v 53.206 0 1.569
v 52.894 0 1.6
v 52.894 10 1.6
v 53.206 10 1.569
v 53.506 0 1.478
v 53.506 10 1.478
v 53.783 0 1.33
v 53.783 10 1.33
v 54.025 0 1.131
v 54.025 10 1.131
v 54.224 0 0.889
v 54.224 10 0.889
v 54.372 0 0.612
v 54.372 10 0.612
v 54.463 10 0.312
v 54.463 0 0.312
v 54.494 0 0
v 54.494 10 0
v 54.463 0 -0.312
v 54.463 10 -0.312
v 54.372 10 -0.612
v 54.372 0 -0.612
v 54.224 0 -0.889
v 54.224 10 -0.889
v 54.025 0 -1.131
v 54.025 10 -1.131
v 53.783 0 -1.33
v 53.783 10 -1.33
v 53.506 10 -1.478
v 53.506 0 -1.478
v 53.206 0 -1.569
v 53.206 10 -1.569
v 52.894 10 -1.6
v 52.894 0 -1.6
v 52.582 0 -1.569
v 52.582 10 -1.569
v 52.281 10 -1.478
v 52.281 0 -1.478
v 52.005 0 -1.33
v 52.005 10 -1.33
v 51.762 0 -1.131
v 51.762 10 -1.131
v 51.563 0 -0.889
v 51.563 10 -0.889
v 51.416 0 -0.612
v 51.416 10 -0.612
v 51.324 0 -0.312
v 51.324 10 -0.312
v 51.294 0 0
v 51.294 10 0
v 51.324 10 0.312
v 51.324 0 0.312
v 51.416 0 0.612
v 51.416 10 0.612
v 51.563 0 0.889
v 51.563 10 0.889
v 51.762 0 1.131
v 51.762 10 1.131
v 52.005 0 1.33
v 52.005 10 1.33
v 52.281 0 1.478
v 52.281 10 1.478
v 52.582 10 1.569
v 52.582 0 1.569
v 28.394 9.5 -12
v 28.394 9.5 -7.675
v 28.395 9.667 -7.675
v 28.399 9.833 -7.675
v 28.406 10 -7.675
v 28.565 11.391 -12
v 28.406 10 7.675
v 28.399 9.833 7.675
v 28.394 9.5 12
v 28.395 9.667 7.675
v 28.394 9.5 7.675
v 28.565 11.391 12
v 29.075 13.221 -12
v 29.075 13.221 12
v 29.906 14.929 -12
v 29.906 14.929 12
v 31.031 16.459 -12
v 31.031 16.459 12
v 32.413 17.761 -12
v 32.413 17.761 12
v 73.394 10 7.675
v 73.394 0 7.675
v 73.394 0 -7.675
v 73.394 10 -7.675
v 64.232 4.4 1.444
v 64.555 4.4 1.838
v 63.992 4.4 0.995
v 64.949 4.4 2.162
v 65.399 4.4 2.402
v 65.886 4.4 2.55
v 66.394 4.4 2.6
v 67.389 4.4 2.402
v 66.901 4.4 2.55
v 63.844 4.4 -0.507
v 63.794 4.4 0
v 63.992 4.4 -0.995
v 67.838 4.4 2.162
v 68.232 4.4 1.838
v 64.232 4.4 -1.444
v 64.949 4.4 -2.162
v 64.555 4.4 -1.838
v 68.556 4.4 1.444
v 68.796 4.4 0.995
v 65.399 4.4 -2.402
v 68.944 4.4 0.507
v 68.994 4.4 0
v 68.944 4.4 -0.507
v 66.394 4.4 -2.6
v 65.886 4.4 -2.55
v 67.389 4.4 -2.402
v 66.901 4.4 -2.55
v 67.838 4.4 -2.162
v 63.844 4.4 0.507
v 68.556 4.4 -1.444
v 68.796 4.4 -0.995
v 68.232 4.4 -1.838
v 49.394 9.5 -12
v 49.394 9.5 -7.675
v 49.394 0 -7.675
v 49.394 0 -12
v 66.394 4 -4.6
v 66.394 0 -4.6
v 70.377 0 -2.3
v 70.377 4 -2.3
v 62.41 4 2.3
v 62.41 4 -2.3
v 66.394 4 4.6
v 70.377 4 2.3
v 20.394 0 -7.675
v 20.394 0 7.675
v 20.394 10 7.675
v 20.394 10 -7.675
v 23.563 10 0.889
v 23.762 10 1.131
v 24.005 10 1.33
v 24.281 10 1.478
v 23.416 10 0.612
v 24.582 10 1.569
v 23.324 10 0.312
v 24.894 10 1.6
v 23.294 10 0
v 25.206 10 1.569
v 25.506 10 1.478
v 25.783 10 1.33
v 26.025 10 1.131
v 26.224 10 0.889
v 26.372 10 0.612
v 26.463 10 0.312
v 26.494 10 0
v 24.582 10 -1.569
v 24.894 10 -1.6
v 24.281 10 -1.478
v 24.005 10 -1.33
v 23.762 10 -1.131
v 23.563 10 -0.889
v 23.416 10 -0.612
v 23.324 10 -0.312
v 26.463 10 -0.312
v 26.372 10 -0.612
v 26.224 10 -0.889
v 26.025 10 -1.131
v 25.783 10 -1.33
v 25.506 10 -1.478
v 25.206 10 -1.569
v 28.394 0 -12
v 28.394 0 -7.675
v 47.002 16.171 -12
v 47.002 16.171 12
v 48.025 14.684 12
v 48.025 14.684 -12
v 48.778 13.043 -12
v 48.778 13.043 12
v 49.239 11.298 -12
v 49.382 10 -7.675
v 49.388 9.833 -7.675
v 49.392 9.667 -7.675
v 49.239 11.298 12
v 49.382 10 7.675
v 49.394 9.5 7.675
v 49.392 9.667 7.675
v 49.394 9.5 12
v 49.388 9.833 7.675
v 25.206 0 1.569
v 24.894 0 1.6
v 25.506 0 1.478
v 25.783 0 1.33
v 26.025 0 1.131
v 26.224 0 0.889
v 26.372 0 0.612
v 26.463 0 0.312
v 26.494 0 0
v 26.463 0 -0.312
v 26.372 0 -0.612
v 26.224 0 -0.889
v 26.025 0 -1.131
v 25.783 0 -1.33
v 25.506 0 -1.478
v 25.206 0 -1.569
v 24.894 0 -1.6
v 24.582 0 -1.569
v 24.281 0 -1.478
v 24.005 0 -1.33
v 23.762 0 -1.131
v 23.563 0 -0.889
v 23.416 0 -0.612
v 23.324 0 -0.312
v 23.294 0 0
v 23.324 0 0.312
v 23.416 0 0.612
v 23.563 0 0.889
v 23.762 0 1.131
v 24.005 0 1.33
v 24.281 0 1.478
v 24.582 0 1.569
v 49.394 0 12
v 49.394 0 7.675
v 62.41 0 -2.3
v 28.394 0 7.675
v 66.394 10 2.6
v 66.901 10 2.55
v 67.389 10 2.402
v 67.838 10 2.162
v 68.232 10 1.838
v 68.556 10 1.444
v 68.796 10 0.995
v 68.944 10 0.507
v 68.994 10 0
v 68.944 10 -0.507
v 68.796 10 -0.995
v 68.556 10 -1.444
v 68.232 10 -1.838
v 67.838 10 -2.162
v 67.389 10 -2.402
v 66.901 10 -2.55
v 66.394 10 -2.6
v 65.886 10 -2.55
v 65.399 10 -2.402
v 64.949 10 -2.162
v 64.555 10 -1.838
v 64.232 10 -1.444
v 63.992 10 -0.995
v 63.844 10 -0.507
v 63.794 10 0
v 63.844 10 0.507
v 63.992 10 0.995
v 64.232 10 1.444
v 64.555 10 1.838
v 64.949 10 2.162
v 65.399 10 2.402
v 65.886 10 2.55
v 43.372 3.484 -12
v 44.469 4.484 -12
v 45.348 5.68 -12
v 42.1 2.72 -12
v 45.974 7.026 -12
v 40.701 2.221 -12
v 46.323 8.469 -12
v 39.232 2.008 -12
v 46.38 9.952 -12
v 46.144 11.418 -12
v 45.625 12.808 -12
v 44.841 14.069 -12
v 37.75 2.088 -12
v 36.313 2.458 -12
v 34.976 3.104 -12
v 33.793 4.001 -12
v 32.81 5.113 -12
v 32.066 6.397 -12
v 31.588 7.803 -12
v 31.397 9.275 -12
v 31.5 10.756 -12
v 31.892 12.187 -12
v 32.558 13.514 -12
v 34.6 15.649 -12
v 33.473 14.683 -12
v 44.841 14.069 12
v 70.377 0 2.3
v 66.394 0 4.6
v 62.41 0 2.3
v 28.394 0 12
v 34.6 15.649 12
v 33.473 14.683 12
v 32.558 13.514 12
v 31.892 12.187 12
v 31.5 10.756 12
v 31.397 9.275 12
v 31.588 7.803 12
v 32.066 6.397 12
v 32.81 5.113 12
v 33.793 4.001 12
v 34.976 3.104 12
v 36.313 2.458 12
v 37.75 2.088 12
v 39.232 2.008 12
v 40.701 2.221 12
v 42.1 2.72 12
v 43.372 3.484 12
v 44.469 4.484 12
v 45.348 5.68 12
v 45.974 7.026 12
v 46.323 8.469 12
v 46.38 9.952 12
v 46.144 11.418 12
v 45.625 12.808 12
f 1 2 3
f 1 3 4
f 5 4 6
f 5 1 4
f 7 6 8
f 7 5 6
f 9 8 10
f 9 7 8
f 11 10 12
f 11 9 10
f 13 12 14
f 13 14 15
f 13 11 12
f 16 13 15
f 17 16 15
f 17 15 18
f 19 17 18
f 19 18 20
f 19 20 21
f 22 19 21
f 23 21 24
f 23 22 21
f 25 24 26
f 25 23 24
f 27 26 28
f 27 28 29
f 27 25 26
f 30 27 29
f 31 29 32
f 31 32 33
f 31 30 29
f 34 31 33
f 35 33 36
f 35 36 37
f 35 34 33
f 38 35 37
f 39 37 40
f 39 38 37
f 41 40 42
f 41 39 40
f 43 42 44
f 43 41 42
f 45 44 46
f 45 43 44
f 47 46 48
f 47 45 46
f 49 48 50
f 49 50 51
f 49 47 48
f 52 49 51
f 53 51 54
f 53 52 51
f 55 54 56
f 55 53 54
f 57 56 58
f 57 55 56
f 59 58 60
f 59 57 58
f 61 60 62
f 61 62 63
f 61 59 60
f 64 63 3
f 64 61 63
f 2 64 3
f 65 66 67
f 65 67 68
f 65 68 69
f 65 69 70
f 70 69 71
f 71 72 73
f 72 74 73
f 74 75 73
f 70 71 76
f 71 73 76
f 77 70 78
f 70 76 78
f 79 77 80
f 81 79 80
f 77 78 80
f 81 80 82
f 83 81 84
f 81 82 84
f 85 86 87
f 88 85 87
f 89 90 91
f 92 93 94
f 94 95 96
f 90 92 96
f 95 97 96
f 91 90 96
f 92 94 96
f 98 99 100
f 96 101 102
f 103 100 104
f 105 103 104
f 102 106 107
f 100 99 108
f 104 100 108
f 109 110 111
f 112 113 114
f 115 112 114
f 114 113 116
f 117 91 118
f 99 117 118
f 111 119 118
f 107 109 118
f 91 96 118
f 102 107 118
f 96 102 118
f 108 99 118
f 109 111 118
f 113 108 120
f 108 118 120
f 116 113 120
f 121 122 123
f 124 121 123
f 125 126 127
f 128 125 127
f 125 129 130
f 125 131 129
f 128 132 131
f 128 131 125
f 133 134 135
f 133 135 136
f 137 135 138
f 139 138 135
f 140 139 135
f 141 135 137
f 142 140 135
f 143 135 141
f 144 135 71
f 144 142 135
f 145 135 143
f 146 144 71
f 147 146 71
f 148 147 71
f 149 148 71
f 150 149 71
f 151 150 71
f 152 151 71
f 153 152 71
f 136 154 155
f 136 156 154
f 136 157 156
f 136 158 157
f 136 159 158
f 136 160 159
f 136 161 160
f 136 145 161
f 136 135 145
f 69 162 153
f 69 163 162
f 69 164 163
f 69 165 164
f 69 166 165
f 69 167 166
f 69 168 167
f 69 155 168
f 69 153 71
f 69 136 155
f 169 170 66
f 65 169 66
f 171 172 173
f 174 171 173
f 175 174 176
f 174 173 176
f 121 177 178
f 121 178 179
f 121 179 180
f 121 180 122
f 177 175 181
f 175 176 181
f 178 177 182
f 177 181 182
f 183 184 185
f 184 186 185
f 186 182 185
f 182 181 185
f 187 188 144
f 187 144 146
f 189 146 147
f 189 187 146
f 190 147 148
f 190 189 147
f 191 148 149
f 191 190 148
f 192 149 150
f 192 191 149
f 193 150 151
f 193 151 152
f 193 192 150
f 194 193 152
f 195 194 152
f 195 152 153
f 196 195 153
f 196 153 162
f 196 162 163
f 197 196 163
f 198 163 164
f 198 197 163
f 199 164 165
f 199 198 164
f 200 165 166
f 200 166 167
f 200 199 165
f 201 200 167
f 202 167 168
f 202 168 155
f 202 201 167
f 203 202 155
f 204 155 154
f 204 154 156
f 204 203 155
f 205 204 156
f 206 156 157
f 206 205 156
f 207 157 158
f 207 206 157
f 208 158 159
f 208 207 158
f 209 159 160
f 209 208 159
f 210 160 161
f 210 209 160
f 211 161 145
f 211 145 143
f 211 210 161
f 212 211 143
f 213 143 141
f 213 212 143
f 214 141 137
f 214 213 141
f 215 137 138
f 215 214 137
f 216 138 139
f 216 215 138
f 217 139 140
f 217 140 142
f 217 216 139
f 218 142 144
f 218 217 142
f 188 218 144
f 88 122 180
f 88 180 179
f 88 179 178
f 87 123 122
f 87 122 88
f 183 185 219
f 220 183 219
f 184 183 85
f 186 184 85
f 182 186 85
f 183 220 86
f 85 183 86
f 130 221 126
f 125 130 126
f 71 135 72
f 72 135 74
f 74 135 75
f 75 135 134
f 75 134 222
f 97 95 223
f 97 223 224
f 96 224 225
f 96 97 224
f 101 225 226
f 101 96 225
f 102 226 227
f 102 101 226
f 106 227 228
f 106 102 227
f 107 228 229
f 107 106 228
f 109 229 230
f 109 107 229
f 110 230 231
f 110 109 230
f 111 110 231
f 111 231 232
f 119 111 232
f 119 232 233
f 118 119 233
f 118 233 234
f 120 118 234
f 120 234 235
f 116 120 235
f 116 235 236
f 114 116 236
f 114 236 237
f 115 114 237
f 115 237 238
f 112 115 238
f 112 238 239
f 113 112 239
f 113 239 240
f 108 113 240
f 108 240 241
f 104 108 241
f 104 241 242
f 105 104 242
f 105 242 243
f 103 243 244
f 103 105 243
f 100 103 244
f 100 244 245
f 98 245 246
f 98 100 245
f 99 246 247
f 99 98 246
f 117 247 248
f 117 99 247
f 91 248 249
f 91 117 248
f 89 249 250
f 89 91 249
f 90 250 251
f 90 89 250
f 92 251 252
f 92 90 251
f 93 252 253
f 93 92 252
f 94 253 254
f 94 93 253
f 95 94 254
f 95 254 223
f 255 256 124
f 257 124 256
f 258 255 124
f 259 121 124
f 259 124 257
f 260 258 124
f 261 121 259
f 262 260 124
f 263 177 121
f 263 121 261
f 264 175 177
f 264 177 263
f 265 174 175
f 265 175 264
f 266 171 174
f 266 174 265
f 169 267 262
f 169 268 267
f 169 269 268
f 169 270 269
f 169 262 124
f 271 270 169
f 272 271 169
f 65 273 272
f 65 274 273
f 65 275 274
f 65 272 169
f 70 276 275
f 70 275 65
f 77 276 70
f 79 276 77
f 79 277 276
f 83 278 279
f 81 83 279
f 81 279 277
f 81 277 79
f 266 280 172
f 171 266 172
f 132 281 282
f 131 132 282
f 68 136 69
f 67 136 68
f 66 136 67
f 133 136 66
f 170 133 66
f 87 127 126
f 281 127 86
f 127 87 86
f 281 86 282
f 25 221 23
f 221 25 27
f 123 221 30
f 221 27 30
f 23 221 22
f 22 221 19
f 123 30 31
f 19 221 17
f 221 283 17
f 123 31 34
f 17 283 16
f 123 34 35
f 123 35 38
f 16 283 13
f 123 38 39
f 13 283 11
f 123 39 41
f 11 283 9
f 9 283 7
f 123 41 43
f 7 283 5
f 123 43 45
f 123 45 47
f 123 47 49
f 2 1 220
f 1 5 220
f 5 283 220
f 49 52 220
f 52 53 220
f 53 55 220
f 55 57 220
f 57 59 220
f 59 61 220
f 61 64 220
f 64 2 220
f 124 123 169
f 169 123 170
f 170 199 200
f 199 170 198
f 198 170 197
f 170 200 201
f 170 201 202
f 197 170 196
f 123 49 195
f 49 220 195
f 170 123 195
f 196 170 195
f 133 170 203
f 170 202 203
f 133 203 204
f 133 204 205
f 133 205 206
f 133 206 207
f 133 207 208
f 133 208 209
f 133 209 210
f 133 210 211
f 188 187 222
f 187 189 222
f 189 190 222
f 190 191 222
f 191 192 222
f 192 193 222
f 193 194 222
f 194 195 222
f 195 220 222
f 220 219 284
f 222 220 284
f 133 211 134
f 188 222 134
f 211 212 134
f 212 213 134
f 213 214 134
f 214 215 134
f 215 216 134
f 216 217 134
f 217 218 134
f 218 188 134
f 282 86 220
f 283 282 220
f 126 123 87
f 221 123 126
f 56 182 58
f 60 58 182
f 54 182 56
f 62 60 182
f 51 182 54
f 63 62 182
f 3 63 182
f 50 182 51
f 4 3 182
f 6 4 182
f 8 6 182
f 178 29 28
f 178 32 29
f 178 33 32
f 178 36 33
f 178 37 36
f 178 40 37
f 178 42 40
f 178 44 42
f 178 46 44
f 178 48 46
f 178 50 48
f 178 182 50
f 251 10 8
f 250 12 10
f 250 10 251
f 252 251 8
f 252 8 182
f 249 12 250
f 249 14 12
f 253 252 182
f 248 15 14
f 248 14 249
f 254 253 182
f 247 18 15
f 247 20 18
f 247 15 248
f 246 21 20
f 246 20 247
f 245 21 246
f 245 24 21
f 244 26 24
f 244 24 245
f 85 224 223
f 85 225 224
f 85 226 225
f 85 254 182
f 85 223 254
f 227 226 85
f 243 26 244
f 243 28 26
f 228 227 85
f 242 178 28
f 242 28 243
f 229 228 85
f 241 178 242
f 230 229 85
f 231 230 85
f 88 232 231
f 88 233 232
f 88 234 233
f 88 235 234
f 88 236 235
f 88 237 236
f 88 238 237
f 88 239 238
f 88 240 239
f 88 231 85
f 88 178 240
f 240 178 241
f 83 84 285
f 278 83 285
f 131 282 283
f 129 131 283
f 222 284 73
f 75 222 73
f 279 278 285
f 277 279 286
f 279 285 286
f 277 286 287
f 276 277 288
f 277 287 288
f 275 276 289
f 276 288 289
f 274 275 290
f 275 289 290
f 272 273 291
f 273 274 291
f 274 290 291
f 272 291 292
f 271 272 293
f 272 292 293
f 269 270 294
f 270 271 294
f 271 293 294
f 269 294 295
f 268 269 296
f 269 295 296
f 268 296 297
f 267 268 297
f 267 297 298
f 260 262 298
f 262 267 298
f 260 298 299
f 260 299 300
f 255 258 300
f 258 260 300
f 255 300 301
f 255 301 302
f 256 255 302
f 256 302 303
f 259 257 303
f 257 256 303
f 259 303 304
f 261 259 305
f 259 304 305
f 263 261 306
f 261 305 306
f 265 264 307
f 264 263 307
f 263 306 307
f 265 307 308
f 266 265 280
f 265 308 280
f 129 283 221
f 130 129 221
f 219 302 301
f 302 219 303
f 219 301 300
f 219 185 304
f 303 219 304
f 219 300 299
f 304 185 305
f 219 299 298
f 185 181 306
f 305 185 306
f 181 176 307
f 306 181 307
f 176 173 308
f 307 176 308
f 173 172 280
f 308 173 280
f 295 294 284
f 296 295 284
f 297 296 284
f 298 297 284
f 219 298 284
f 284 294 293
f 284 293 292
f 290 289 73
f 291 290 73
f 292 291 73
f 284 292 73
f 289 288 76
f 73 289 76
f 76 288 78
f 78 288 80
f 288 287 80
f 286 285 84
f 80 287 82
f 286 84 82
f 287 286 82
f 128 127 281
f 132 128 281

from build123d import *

# Parameters (mm, degrees)
SKETCH1_W                = 53
SKETCH1_H                = 15.35
SKETCH1_R                = 1.6
SKETCH1_R_2              = 2.6
BOSS_EXTRUDE1_DEPTH      = 10
BOSS_EXTRUDE2_DEPTH      = 4.325
BOSS_EXTRUDE2_DEPTH_BACK = 19.675
CUT_EXTRUDE1_DEPTH       = 79.033367864
CUT_EXTRUDE2_DEPTH       = 4
SKETCH5_R                = 2.6
BOSS_EXTRUDE3_DEPTH      = 0.4


with BuildPart() as part:
    # Sketch1 → Boss-Extrude1 (new body)
    with BuildSketch(Plane(origin=(0, 0, 0), x_dir=(1, 0, 0), z_dir=(0, 1, 0))):
        with Locations((46.893734614, 0)):
            Rectangle(SKETCH1_W, SKETCH1_H)
        with Locations(Location((52.893734614, 0, 0), (0, 0, 270))):
            Circle(SKETCH1_R, mode=Mode.SUBTRACT)
        with Locations(Location((24.893734614, 0, 0), (0, 0, 270))):
            Circle(SKETCH1_R, mode=Mode.SUBTRACT)
        with Locations(Location((66.393734614, 0, 0), (0, 0, 270))):
            Circle(SKETCH1_R_2, mode=Mode.SUBTRACT)
    extrude(amount=BOSS_EXTRUDE1_DEPTH)

    # Sketch2 → Boss-Extrude2 (add, two sides: drawn at the far end of the back side and taken through both)
    with BuildSketch(Plane(origin=(0, 0, -7.675), x_dir=(-1, 0, 0), z_dir=(0, 0, -1)).offset(-BOSS_EXTRUDE2_DEPTH_BACK)):
        with BuildLine():
            Line((-44.841298991, 14.069078461), (-47.002272565, 16.170952878))
            ThreePointArc((-47.002272565, 16.170952878), (-48.777803829, 13.043328345), (-49.393734614, 9.5))
            Line((-49.393734614, 9.5), (-49.393734614, 0))
            Line((-49.393734614, 0), (-28.393734614, 0))
            Line((-28.393734614, 0), (-28.393734614, 9.5))
            ThreePointArc((-28.393734614, 9.5), (-29.451814157, 14.09348866), (-32.412808532, 17.761210391))
            Line((-32.412808532, 17.761210391), (-34.599781066, 15.649143267))
            ThreePointArc((-34.599781066, 15.649143267), (-37.750161971, 2.087696606), (-44.841298991, 14.069078461))
        make_face()
    extrude(amount=BOSS_EXTRUDE2_DEPTH + BOSS_EXTRUDE2_DEPTH_BACK)

    # Sketch3 → Cut-Extrude1 (cut, through all)
    with BuildSketch(Plane.XY.offset(7.675)):
        with BuildLine():
            Line((46.377049388, 10), (31.410419841, 10))
            ThreePointArc((31.410419841, 10), (38.893734614, 2), (46.377049388, 10))
        make_face()
    extrude(amount=-CUT_EXTRUDE1_DEPTH, mode=Mode.SUBTRACT)

    # Sketch4 → Cut-Extrude2 (cut)
    with BuildSketch(Plane.XZ):
        Polygon((62.410017757, 2.3), (62.410017757, -2.3), (66.393734614, -4.6), (70.377451472, -2.3), (70.377451472, 2.3), (66.393734614, 4.6), align=None)
    extrude(amount=-CUT_EXTRUDE2_DEPTH, mode=Mode.SUBTRACT)

    # Sketch5 → Boss-Extrude3 (add)
    with BuildSketch(Plane.XZ.offset(-4)):
        with Locations(Location((66.393734614, 0, 0), (0, 0, 270))):
            Circle(SKETCH5_R)
    extrude(amount=-BOSS_EXTRUDE3_DEPTH)


solid = part.part
